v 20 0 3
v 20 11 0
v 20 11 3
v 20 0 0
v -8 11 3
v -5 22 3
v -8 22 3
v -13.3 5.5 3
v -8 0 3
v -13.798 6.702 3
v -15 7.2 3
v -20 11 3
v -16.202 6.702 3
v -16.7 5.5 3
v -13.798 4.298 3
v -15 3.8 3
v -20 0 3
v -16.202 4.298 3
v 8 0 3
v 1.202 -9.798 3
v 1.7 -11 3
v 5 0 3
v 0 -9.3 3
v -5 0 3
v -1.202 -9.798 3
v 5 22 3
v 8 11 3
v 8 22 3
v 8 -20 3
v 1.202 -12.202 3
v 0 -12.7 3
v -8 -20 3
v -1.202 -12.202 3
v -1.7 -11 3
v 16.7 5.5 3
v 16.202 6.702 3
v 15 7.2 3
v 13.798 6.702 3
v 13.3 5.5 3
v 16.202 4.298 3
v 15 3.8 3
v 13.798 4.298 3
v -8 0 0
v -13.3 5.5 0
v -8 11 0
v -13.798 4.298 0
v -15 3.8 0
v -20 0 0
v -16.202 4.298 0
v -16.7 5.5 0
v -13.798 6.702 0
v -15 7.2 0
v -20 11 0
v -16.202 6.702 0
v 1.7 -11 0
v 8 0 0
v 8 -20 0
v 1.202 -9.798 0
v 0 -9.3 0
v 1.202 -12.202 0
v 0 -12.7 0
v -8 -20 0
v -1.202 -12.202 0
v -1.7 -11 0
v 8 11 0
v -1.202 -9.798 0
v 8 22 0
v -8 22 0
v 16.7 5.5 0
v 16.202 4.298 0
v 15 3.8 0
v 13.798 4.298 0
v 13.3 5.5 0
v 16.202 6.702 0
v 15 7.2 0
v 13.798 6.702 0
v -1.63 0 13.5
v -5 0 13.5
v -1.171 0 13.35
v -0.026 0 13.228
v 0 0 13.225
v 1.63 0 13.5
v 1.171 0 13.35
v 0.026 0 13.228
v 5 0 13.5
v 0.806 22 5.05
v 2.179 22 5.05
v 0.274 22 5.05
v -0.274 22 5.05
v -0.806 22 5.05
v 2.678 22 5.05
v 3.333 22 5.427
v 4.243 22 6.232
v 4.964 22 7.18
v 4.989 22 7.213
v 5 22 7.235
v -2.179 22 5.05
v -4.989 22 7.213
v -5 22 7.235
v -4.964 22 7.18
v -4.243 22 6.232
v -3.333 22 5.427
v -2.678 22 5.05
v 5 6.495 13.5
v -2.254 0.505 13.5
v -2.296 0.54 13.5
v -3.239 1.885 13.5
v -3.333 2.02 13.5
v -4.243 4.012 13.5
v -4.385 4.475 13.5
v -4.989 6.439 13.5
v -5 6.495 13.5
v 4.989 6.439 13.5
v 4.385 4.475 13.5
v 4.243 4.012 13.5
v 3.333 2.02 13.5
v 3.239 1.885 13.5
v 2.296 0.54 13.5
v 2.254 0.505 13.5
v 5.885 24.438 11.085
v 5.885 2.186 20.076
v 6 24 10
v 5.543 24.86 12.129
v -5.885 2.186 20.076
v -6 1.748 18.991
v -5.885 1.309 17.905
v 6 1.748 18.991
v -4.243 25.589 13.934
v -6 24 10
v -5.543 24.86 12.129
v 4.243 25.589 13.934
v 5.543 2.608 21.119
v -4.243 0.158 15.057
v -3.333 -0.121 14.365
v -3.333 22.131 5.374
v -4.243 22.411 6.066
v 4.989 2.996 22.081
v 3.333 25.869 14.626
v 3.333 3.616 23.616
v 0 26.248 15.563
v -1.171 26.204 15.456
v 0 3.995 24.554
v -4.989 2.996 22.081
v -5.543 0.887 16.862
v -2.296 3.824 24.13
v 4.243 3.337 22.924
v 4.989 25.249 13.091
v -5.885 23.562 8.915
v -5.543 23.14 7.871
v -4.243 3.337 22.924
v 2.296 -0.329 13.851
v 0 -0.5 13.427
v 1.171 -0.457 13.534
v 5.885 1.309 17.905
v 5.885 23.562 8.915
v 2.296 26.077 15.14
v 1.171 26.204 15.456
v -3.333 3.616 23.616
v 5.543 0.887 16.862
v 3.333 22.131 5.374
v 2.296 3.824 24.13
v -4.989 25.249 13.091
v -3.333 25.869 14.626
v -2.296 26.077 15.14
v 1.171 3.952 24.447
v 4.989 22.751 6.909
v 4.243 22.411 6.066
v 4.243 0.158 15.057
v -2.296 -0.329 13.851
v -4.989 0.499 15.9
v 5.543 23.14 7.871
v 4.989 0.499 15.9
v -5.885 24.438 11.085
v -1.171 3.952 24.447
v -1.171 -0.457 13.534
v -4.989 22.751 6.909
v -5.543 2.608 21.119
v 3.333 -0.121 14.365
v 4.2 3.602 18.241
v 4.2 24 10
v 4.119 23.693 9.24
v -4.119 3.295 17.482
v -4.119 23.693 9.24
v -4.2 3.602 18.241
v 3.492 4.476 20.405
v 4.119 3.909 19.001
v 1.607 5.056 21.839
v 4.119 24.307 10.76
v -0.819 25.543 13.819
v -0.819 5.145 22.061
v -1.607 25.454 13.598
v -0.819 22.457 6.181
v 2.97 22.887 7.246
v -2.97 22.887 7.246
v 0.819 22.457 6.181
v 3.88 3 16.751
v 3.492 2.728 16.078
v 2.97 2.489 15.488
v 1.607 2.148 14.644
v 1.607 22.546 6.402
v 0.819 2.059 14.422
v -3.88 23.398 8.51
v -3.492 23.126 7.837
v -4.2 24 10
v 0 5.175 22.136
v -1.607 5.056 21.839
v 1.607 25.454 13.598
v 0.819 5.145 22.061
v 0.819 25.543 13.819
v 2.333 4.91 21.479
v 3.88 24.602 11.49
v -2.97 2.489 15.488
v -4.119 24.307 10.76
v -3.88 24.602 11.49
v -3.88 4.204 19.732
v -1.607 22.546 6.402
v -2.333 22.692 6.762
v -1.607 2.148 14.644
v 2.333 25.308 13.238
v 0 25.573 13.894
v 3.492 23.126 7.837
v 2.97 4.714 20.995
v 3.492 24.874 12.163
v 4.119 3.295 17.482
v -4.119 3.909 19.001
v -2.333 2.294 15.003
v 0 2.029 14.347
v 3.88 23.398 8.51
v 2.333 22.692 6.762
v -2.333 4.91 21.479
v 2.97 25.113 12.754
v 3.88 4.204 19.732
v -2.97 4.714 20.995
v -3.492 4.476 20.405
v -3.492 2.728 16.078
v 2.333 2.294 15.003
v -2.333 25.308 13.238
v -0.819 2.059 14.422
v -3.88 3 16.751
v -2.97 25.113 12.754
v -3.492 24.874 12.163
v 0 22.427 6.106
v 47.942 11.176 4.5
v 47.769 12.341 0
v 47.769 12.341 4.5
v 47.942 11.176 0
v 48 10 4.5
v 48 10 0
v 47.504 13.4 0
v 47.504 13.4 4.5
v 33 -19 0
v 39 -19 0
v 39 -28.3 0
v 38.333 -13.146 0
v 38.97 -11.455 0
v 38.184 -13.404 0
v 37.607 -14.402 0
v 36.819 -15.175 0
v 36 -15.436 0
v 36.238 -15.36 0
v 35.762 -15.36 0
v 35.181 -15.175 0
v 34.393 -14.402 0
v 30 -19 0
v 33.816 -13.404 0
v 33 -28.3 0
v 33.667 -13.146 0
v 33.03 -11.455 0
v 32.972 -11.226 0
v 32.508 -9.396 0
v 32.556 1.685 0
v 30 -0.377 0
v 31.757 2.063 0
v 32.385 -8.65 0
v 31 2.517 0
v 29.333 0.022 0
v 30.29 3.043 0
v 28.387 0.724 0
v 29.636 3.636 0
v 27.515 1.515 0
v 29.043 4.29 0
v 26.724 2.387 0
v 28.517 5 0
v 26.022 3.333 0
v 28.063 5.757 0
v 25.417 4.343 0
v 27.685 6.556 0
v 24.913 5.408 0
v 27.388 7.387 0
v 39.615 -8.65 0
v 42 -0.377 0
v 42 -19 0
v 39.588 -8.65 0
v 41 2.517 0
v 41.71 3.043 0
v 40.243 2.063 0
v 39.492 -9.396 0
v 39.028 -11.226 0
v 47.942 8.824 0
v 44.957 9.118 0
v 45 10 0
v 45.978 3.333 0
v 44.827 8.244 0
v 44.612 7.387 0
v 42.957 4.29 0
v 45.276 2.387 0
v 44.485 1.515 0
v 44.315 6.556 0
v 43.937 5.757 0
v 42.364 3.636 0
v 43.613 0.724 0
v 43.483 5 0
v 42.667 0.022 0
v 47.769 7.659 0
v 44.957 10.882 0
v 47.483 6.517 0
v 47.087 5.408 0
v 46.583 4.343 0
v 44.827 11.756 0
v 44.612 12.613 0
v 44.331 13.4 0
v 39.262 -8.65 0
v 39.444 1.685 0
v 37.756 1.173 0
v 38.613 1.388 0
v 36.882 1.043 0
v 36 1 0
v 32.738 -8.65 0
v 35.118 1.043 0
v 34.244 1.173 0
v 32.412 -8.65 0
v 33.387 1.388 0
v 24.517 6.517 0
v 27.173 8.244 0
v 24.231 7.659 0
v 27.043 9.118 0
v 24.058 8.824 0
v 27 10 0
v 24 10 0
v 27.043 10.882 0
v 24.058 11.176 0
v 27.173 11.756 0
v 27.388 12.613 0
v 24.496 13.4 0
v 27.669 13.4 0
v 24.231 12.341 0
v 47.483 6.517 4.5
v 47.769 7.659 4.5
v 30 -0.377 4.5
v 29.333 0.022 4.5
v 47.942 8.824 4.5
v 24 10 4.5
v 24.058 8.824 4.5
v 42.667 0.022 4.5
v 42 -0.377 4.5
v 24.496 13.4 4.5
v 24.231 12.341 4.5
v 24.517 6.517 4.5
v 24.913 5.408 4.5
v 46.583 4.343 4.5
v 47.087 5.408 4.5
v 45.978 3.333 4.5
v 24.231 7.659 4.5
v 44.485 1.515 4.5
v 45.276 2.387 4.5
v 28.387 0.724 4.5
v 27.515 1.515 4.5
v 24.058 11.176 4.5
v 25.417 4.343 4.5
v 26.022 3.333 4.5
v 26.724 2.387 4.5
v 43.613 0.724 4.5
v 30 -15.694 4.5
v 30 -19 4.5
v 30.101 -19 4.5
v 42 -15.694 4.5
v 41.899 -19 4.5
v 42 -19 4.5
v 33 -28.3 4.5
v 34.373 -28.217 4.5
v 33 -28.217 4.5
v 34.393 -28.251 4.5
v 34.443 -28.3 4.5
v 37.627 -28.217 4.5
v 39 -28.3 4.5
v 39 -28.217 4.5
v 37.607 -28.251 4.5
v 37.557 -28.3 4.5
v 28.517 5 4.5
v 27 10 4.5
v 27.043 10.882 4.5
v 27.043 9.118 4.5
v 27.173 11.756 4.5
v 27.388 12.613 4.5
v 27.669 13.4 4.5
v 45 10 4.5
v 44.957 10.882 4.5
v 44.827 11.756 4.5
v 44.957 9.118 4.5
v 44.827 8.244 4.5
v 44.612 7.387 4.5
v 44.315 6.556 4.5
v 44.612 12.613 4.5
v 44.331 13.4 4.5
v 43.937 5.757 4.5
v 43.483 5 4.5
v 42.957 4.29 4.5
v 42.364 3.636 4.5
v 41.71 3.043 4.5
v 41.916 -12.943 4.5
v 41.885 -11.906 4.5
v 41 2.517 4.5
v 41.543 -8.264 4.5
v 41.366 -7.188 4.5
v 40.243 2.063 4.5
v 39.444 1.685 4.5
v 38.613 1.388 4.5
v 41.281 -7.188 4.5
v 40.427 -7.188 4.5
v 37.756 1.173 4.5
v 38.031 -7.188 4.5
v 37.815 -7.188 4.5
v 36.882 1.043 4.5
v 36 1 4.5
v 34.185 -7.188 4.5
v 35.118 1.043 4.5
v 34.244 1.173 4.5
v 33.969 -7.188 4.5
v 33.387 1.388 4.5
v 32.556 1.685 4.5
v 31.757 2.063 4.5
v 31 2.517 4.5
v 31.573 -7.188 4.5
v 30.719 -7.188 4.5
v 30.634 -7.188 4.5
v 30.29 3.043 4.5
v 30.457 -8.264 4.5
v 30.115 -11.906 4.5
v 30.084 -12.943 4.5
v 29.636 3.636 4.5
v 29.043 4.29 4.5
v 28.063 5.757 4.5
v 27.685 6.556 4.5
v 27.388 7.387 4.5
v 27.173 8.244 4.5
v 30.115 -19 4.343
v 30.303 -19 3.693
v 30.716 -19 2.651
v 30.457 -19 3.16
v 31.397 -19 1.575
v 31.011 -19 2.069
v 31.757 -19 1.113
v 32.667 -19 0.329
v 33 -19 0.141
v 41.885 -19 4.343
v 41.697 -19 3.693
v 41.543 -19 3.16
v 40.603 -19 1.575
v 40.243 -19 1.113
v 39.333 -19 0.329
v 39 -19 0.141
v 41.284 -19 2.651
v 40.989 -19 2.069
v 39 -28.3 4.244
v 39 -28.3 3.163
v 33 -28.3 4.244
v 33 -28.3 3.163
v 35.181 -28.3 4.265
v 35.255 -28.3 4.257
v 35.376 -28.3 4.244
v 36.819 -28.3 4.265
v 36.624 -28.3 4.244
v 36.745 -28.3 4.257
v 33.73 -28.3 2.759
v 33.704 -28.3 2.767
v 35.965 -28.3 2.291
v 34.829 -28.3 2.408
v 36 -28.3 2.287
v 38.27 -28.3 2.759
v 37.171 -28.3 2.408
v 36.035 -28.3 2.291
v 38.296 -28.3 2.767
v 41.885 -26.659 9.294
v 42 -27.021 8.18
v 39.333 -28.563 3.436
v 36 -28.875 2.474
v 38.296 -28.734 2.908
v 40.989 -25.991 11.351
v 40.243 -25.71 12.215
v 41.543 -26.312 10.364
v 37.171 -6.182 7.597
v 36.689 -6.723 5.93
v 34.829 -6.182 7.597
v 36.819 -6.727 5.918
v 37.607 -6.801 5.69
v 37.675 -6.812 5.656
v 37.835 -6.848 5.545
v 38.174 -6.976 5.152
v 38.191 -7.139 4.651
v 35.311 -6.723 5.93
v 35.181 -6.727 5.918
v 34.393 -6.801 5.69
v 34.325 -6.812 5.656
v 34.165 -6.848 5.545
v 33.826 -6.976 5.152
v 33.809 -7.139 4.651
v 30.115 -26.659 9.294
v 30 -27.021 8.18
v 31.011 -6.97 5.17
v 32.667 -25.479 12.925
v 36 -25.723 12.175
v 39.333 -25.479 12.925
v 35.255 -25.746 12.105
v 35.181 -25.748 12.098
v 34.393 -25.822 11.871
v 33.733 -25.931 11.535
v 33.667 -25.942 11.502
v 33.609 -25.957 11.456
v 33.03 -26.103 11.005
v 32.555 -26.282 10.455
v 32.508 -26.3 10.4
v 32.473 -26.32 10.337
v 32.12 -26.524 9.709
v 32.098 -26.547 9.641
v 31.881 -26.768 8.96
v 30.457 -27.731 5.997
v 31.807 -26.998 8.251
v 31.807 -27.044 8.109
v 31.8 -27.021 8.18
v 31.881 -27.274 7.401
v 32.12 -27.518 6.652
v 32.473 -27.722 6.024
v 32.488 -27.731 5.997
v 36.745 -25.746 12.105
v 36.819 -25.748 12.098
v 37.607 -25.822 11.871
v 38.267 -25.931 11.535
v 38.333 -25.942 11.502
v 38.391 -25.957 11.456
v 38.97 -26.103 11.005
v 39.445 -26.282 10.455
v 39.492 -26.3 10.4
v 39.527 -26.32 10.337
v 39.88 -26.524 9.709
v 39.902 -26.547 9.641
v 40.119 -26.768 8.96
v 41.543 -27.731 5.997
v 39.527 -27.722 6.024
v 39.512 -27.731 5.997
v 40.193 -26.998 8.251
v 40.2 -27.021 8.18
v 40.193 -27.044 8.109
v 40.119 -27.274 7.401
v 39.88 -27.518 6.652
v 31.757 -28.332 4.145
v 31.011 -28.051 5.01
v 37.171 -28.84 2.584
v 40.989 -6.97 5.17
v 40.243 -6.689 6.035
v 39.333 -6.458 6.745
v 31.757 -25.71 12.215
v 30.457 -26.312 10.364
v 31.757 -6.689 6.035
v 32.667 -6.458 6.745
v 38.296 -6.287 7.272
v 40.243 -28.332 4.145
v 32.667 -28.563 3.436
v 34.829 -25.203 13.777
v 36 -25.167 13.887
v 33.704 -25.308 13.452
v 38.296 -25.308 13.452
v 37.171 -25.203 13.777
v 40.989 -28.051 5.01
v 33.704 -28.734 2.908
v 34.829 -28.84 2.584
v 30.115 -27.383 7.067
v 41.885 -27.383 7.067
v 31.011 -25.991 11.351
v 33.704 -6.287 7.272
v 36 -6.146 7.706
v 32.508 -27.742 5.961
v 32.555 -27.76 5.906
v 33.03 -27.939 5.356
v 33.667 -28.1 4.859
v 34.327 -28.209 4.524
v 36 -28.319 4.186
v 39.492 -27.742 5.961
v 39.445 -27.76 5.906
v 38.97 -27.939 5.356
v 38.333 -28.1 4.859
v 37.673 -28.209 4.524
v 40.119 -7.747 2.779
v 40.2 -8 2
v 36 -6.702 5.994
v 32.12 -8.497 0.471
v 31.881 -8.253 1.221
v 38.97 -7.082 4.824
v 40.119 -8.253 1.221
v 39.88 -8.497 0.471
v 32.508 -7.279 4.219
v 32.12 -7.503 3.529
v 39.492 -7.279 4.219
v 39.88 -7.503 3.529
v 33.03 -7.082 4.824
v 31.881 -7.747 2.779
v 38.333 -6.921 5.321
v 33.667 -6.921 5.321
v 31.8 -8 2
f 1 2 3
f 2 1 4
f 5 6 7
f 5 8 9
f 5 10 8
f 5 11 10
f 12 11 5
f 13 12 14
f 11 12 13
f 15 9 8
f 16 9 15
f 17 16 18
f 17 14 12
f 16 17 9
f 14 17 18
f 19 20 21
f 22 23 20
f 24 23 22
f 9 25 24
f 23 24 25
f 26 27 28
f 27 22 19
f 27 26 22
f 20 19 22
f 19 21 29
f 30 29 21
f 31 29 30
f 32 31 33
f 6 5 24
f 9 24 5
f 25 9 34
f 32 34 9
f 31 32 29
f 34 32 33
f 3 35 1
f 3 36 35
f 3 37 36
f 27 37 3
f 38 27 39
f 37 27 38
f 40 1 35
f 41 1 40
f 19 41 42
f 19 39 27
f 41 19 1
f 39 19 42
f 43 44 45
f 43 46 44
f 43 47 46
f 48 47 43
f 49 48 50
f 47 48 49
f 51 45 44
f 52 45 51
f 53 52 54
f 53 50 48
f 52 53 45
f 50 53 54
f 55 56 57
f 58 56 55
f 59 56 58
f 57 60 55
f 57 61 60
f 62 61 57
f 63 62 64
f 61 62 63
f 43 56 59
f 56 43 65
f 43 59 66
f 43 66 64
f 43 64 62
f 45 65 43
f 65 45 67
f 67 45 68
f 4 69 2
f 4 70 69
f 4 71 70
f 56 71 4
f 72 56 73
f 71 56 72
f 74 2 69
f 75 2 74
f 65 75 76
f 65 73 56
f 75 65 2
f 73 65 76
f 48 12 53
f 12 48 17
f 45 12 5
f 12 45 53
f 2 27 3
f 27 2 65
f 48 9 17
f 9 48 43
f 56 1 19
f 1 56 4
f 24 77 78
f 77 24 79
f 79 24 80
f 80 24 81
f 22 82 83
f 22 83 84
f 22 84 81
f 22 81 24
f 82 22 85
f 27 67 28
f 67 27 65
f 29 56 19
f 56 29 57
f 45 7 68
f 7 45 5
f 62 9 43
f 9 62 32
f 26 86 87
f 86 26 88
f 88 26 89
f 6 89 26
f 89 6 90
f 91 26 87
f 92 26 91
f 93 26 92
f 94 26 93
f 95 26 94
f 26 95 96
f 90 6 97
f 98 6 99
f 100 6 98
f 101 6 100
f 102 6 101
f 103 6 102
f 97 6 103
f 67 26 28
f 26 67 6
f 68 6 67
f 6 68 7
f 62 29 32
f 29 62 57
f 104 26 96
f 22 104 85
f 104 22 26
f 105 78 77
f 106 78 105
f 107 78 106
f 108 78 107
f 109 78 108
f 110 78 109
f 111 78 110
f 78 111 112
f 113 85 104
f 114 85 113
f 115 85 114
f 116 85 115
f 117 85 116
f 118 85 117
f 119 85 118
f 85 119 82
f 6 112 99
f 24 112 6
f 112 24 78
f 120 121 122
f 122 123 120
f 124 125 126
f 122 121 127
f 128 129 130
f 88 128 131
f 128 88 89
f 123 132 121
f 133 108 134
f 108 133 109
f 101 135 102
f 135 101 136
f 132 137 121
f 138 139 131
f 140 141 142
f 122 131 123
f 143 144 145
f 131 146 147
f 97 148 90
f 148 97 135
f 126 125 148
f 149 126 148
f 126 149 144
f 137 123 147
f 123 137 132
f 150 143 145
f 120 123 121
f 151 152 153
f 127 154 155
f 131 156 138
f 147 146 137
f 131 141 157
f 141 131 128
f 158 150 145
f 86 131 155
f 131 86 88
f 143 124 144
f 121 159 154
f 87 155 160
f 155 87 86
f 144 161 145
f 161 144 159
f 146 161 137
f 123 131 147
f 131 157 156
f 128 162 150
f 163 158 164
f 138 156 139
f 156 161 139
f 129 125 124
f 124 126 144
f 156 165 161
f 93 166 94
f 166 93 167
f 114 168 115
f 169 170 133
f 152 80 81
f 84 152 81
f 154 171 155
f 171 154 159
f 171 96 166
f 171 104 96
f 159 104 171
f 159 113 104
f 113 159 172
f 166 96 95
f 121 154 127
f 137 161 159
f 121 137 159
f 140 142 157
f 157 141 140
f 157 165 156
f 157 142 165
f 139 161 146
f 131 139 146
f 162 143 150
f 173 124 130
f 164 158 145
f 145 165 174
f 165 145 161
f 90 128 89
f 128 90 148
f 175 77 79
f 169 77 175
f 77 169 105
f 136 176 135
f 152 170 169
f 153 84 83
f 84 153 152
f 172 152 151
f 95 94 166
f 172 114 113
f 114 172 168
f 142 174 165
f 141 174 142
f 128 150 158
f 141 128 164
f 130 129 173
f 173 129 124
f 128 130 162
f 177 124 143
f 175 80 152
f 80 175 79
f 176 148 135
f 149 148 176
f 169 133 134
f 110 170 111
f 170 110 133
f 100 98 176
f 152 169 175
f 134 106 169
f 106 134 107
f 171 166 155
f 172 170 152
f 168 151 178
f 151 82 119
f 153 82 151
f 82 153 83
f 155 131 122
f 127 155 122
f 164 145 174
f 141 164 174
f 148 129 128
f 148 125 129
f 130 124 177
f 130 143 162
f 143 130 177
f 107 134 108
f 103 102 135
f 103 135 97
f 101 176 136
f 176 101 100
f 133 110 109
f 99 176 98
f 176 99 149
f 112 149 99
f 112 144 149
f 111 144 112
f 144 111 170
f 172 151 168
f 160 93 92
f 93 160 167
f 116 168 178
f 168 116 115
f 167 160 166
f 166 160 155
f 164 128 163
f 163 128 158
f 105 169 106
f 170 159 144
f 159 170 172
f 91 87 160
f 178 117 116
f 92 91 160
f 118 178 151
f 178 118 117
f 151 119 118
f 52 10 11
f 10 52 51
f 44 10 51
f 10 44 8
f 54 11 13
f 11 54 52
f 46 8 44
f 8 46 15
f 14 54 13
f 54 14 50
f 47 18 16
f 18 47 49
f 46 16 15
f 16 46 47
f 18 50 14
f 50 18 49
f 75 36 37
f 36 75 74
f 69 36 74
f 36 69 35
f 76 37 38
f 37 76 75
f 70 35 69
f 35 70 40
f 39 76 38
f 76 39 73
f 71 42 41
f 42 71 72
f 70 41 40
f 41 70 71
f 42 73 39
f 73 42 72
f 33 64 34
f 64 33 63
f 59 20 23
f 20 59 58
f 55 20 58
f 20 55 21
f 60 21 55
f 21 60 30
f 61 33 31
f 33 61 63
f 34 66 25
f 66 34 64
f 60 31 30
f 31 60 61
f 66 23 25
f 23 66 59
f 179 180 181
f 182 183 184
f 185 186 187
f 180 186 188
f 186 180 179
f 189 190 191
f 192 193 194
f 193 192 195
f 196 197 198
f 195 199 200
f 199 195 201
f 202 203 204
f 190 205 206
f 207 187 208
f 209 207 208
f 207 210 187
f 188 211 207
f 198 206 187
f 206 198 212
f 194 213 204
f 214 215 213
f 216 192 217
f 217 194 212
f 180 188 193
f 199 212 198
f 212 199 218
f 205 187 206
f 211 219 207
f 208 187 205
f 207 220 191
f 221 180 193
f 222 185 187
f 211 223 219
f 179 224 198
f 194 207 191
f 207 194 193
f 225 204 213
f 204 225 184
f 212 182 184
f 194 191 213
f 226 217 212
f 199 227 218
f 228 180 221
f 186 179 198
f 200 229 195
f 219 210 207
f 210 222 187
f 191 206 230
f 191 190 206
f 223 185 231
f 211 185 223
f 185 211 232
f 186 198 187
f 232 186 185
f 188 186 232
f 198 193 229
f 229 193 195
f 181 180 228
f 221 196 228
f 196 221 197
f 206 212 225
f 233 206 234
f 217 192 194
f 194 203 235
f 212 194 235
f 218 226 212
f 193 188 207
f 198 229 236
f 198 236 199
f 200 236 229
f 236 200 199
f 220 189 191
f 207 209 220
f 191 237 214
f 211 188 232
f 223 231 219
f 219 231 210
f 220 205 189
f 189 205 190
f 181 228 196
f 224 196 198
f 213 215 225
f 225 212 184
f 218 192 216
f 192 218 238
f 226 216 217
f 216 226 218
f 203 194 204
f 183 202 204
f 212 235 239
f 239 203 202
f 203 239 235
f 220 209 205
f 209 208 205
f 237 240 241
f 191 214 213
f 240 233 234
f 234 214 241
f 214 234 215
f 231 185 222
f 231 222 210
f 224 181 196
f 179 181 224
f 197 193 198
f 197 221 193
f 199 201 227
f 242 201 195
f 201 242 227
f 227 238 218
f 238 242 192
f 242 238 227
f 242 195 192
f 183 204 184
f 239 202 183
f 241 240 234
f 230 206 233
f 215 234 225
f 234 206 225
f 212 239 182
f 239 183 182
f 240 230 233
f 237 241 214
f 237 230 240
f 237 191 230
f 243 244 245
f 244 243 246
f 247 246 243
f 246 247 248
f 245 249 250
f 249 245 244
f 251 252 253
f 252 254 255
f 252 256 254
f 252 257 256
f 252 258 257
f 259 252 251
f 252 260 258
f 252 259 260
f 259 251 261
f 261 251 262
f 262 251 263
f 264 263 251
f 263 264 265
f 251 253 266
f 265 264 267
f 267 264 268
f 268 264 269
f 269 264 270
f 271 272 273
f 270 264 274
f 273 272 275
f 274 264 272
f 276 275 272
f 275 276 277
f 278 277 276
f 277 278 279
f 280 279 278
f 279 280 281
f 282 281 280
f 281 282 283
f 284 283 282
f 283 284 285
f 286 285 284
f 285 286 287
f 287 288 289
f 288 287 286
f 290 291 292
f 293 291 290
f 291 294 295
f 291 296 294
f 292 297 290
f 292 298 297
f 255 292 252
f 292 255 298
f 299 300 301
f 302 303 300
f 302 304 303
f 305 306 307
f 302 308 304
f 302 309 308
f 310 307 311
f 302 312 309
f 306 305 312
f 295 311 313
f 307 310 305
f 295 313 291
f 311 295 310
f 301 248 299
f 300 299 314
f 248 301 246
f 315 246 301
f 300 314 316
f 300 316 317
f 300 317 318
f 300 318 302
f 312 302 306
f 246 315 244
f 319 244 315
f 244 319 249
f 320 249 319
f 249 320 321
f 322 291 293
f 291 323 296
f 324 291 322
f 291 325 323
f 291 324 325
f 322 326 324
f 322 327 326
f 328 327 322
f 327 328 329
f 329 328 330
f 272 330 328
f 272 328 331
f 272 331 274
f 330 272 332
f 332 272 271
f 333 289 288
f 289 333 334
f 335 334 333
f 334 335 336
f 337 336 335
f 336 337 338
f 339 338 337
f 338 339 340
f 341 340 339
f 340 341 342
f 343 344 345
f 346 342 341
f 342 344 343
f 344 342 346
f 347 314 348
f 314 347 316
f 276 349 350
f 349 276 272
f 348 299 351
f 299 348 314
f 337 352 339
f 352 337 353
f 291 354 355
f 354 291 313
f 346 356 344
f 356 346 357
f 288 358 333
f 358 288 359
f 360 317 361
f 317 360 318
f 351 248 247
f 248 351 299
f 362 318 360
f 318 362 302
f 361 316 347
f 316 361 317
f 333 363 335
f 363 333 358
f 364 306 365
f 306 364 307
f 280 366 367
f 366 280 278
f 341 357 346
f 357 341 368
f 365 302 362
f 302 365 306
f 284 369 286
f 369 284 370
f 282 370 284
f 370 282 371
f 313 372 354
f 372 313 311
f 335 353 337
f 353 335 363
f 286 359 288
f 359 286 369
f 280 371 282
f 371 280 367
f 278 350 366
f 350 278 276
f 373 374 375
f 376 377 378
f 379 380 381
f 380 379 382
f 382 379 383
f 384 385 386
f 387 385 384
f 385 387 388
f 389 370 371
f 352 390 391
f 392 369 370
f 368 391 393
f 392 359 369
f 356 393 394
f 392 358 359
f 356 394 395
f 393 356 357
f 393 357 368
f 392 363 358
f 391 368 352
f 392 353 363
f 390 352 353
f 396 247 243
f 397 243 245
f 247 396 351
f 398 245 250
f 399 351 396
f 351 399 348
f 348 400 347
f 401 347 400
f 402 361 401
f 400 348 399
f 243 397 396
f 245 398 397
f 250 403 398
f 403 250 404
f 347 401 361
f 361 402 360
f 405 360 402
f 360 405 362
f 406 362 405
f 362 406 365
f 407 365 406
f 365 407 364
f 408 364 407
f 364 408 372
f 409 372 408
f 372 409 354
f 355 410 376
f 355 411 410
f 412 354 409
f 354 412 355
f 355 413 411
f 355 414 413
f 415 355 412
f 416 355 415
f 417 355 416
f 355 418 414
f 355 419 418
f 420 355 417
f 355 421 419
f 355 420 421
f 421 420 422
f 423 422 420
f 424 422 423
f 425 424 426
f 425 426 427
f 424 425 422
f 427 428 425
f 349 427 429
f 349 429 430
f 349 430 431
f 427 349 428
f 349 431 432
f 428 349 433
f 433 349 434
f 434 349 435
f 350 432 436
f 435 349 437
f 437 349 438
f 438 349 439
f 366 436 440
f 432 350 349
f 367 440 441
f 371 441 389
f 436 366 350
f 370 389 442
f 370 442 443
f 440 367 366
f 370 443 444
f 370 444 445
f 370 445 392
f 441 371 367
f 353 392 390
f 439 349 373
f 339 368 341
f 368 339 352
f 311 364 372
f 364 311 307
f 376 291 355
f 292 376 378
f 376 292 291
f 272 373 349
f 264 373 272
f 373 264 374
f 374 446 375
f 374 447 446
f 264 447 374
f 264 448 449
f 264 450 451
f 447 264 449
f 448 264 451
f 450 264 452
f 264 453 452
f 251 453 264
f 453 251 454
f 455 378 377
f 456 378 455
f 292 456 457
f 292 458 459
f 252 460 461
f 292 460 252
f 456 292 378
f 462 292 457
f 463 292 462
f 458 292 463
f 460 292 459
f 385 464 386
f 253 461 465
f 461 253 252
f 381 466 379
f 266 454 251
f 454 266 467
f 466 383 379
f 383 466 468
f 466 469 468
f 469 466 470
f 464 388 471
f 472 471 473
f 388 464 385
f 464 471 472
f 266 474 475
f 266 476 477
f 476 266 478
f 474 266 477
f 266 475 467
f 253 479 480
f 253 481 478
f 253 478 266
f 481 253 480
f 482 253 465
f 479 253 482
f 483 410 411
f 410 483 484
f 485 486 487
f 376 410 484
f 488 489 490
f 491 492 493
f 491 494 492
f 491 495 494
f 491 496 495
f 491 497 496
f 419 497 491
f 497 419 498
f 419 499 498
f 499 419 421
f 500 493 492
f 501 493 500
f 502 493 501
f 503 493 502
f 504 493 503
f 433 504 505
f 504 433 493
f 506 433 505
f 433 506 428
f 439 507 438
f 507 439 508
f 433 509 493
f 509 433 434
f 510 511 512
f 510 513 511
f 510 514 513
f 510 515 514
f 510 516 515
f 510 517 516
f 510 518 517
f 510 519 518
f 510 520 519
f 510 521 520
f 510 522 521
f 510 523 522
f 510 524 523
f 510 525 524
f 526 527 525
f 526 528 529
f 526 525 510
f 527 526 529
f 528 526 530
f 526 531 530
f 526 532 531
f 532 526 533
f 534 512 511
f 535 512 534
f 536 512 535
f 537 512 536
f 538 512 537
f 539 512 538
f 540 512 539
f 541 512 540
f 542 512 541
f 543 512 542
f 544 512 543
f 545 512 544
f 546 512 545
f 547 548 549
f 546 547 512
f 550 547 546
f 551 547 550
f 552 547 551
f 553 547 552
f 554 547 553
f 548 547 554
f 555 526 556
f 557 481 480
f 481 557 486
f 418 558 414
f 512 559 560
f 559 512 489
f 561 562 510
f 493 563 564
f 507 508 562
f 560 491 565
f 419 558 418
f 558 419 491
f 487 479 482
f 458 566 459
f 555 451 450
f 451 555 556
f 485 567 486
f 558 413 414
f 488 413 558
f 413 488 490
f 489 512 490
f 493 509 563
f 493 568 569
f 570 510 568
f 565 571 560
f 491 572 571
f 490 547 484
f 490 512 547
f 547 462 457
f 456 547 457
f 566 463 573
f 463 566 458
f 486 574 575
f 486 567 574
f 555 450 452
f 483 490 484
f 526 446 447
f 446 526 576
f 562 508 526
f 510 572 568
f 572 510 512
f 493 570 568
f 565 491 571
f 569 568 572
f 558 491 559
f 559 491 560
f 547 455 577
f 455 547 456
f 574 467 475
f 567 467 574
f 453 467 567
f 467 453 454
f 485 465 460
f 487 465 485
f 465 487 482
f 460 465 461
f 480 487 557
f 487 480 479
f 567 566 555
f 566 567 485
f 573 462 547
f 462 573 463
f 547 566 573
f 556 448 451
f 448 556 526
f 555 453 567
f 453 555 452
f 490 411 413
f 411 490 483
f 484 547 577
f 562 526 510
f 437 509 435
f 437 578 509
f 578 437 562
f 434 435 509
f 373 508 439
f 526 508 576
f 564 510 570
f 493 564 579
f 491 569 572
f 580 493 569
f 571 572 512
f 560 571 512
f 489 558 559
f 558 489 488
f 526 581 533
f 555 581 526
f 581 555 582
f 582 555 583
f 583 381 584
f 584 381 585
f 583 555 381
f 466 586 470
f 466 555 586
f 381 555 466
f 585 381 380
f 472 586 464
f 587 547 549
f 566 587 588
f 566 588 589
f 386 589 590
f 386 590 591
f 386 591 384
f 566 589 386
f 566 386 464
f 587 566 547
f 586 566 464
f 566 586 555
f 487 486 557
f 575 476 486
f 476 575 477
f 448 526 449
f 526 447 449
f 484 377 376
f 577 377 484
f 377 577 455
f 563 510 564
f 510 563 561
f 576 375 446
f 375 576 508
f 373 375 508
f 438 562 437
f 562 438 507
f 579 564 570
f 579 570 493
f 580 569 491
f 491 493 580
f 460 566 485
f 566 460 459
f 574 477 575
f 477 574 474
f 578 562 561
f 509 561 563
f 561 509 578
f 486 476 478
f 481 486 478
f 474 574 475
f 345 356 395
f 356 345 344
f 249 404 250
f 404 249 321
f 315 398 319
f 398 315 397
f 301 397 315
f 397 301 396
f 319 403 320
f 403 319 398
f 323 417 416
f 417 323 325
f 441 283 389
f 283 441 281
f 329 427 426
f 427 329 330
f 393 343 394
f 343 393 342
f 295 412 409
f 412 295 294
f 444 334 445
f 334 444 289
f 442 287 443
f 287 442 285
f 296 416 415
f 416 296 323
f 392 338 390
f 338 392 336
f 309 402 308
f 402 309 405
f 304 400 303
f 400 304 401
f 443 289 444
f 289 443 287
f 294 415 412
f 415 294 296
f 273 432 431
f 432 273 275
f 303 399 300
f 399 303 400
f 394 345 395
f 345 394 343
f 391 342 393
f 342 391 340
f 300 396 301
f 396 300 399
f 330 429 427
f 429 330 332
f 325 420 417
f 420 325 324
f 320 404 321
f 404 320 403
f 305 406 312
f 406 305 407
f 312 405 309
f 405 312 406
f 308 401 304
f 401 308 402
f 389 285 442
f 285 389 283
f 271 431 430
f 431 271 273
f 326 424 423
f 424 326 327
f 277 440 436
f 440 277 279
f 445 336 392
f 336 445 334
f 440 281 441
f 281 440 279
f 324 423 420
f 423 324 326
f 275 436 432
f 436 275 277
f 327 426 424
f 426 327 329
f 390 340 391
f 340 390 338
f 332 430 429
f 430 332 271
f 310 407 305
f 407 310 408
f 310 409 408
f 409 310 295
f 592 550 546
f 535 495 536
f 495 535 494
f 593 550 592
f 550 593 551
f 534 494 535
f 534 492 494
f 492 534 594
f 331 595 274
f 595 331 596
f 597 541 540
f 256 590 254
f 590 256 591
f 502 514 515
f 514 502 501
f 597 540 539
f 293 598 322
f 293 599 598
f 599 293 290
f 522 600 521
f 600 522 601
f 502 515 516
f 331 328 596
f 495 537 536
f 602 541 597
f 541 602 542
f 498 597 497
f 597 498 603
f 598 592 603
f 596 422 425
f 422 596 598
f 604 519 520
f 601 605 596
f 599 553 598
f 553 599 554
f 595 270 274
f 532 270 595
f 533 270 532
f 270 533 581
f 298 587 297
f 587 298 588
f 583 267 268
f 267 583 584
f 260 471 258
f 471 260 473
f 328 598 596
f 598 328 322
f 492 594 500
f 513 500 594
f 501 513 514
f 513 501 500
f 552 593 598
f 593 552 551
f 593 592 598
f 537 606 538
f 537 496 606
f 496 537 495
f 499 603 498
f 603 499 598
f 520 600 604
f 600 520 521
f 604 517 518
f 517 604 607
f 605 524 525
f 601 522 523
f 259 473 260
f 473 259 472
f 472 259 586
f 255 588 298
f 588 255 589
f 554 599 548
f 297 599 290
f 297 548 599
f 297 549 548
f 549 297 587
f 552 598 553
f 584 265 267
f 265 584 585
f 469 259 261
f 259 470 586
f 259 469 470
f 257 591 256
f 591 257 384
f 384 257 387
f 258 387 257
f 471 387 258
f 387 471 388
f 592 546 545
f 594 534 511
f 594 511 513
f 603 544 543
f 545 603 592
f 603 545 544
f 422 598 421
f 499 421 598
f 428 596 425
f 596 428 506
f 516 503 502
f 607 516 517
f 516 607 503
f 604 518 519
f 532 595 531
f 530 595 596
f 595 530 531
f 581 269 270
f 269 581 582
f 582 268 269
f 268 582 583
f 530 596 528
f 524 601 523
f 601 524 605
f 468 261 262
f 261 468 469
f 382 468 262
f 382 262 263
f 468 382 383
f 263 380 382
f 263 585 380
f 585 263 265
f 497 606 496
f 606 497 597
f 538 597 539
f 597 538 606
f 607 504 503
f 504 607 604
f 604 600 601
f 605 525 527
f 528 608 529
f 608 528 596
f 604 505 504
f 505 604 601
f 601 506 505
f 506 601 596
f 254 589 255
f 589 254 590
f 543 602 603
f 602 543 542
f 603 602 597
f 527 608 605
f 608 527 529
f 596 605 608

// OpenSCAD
// AIR HOCKEY ROBOT PROJECT (AHROBOT)
// 
// by Jose Julio

// PS3 Camera holder (needs a 8mm carbon tube)

module rod_base(angle=20,height=20)
{
	rotate([angle,0,0]) cylinder(r=6,h=height,$fn=32);
}

module rod_holes(angle=20,height=22)
{
	rotate([angle,0,0]) cylinder(r=4.2,h=height,$fn=32);
}

module PS3Cam_base()
{
	cylinder(r=12,h=4.5,$fn=64);
	translate([-6,-29,0]) cube([12,20,4.5]);
	// Support to print the rod holder
	translate([-3,-38.3,0]) cube([6,30,4.5]);
	// Rod holder
	translate([0,-18,2]) rod_base(72);
}

module PS3Cam_holes()
{
	translate([-15,3.4,-1]) cube([30,20,10]);
	translate([0,0,-1]) cylinder(r=9,h=6,$fn=64);
	// Rod holder
	translate([0,-18,2]) rod_holes(72);
	// Cut elements lower than 0
	translate([0,0,-5]) cube([200,200,10],center=true);
}

module base()
{
	translate([-20,0,0]) cube([40,11,3]);
	translate([-8,-20,0]) cube([16,42,3]);
	//translate([-8,-33,0]) cube([16,49,3]);
	//translate([-20,-11-22,0]) cube([40,11,3]);
	// Rod reinforcement
	translate([-5,0,2.5]) cube([10,22,11]);
	
	// Rod holder
	translate([0,24,10]) rod_base(68,24);
}

module holes()
{
	translate([-15,5.5,0]) cylinder(r=1.7,h=10,$fn=8,center=true);
	translate([15,5.5,0]) cylinder(r=1.7,h=10,$fn=8,center=true);
	translate([0,-11,0]) cylinder(r=1.7,h=10,$fn=8,center=true);

	//translate([-15,-27.5,0]) cylinder(r=1.7,h=10,$fn=8,center=true);
	//translate([15,-27.5,0]) cylinder(r=1.7,h=10,$fn=8,center=true);
	
// rod holder
	translate([0,24,10]) rod_holes(68,22);

	// Cut elements lower than 0
	translate([0,0,-5]) cube([200,200,10],center=true);
}


difference()
{
 base();
 holes();
}


translate([36,10,0]) difference()
{
 PS3Cam_base();
 PS3Cam_holes();
}
